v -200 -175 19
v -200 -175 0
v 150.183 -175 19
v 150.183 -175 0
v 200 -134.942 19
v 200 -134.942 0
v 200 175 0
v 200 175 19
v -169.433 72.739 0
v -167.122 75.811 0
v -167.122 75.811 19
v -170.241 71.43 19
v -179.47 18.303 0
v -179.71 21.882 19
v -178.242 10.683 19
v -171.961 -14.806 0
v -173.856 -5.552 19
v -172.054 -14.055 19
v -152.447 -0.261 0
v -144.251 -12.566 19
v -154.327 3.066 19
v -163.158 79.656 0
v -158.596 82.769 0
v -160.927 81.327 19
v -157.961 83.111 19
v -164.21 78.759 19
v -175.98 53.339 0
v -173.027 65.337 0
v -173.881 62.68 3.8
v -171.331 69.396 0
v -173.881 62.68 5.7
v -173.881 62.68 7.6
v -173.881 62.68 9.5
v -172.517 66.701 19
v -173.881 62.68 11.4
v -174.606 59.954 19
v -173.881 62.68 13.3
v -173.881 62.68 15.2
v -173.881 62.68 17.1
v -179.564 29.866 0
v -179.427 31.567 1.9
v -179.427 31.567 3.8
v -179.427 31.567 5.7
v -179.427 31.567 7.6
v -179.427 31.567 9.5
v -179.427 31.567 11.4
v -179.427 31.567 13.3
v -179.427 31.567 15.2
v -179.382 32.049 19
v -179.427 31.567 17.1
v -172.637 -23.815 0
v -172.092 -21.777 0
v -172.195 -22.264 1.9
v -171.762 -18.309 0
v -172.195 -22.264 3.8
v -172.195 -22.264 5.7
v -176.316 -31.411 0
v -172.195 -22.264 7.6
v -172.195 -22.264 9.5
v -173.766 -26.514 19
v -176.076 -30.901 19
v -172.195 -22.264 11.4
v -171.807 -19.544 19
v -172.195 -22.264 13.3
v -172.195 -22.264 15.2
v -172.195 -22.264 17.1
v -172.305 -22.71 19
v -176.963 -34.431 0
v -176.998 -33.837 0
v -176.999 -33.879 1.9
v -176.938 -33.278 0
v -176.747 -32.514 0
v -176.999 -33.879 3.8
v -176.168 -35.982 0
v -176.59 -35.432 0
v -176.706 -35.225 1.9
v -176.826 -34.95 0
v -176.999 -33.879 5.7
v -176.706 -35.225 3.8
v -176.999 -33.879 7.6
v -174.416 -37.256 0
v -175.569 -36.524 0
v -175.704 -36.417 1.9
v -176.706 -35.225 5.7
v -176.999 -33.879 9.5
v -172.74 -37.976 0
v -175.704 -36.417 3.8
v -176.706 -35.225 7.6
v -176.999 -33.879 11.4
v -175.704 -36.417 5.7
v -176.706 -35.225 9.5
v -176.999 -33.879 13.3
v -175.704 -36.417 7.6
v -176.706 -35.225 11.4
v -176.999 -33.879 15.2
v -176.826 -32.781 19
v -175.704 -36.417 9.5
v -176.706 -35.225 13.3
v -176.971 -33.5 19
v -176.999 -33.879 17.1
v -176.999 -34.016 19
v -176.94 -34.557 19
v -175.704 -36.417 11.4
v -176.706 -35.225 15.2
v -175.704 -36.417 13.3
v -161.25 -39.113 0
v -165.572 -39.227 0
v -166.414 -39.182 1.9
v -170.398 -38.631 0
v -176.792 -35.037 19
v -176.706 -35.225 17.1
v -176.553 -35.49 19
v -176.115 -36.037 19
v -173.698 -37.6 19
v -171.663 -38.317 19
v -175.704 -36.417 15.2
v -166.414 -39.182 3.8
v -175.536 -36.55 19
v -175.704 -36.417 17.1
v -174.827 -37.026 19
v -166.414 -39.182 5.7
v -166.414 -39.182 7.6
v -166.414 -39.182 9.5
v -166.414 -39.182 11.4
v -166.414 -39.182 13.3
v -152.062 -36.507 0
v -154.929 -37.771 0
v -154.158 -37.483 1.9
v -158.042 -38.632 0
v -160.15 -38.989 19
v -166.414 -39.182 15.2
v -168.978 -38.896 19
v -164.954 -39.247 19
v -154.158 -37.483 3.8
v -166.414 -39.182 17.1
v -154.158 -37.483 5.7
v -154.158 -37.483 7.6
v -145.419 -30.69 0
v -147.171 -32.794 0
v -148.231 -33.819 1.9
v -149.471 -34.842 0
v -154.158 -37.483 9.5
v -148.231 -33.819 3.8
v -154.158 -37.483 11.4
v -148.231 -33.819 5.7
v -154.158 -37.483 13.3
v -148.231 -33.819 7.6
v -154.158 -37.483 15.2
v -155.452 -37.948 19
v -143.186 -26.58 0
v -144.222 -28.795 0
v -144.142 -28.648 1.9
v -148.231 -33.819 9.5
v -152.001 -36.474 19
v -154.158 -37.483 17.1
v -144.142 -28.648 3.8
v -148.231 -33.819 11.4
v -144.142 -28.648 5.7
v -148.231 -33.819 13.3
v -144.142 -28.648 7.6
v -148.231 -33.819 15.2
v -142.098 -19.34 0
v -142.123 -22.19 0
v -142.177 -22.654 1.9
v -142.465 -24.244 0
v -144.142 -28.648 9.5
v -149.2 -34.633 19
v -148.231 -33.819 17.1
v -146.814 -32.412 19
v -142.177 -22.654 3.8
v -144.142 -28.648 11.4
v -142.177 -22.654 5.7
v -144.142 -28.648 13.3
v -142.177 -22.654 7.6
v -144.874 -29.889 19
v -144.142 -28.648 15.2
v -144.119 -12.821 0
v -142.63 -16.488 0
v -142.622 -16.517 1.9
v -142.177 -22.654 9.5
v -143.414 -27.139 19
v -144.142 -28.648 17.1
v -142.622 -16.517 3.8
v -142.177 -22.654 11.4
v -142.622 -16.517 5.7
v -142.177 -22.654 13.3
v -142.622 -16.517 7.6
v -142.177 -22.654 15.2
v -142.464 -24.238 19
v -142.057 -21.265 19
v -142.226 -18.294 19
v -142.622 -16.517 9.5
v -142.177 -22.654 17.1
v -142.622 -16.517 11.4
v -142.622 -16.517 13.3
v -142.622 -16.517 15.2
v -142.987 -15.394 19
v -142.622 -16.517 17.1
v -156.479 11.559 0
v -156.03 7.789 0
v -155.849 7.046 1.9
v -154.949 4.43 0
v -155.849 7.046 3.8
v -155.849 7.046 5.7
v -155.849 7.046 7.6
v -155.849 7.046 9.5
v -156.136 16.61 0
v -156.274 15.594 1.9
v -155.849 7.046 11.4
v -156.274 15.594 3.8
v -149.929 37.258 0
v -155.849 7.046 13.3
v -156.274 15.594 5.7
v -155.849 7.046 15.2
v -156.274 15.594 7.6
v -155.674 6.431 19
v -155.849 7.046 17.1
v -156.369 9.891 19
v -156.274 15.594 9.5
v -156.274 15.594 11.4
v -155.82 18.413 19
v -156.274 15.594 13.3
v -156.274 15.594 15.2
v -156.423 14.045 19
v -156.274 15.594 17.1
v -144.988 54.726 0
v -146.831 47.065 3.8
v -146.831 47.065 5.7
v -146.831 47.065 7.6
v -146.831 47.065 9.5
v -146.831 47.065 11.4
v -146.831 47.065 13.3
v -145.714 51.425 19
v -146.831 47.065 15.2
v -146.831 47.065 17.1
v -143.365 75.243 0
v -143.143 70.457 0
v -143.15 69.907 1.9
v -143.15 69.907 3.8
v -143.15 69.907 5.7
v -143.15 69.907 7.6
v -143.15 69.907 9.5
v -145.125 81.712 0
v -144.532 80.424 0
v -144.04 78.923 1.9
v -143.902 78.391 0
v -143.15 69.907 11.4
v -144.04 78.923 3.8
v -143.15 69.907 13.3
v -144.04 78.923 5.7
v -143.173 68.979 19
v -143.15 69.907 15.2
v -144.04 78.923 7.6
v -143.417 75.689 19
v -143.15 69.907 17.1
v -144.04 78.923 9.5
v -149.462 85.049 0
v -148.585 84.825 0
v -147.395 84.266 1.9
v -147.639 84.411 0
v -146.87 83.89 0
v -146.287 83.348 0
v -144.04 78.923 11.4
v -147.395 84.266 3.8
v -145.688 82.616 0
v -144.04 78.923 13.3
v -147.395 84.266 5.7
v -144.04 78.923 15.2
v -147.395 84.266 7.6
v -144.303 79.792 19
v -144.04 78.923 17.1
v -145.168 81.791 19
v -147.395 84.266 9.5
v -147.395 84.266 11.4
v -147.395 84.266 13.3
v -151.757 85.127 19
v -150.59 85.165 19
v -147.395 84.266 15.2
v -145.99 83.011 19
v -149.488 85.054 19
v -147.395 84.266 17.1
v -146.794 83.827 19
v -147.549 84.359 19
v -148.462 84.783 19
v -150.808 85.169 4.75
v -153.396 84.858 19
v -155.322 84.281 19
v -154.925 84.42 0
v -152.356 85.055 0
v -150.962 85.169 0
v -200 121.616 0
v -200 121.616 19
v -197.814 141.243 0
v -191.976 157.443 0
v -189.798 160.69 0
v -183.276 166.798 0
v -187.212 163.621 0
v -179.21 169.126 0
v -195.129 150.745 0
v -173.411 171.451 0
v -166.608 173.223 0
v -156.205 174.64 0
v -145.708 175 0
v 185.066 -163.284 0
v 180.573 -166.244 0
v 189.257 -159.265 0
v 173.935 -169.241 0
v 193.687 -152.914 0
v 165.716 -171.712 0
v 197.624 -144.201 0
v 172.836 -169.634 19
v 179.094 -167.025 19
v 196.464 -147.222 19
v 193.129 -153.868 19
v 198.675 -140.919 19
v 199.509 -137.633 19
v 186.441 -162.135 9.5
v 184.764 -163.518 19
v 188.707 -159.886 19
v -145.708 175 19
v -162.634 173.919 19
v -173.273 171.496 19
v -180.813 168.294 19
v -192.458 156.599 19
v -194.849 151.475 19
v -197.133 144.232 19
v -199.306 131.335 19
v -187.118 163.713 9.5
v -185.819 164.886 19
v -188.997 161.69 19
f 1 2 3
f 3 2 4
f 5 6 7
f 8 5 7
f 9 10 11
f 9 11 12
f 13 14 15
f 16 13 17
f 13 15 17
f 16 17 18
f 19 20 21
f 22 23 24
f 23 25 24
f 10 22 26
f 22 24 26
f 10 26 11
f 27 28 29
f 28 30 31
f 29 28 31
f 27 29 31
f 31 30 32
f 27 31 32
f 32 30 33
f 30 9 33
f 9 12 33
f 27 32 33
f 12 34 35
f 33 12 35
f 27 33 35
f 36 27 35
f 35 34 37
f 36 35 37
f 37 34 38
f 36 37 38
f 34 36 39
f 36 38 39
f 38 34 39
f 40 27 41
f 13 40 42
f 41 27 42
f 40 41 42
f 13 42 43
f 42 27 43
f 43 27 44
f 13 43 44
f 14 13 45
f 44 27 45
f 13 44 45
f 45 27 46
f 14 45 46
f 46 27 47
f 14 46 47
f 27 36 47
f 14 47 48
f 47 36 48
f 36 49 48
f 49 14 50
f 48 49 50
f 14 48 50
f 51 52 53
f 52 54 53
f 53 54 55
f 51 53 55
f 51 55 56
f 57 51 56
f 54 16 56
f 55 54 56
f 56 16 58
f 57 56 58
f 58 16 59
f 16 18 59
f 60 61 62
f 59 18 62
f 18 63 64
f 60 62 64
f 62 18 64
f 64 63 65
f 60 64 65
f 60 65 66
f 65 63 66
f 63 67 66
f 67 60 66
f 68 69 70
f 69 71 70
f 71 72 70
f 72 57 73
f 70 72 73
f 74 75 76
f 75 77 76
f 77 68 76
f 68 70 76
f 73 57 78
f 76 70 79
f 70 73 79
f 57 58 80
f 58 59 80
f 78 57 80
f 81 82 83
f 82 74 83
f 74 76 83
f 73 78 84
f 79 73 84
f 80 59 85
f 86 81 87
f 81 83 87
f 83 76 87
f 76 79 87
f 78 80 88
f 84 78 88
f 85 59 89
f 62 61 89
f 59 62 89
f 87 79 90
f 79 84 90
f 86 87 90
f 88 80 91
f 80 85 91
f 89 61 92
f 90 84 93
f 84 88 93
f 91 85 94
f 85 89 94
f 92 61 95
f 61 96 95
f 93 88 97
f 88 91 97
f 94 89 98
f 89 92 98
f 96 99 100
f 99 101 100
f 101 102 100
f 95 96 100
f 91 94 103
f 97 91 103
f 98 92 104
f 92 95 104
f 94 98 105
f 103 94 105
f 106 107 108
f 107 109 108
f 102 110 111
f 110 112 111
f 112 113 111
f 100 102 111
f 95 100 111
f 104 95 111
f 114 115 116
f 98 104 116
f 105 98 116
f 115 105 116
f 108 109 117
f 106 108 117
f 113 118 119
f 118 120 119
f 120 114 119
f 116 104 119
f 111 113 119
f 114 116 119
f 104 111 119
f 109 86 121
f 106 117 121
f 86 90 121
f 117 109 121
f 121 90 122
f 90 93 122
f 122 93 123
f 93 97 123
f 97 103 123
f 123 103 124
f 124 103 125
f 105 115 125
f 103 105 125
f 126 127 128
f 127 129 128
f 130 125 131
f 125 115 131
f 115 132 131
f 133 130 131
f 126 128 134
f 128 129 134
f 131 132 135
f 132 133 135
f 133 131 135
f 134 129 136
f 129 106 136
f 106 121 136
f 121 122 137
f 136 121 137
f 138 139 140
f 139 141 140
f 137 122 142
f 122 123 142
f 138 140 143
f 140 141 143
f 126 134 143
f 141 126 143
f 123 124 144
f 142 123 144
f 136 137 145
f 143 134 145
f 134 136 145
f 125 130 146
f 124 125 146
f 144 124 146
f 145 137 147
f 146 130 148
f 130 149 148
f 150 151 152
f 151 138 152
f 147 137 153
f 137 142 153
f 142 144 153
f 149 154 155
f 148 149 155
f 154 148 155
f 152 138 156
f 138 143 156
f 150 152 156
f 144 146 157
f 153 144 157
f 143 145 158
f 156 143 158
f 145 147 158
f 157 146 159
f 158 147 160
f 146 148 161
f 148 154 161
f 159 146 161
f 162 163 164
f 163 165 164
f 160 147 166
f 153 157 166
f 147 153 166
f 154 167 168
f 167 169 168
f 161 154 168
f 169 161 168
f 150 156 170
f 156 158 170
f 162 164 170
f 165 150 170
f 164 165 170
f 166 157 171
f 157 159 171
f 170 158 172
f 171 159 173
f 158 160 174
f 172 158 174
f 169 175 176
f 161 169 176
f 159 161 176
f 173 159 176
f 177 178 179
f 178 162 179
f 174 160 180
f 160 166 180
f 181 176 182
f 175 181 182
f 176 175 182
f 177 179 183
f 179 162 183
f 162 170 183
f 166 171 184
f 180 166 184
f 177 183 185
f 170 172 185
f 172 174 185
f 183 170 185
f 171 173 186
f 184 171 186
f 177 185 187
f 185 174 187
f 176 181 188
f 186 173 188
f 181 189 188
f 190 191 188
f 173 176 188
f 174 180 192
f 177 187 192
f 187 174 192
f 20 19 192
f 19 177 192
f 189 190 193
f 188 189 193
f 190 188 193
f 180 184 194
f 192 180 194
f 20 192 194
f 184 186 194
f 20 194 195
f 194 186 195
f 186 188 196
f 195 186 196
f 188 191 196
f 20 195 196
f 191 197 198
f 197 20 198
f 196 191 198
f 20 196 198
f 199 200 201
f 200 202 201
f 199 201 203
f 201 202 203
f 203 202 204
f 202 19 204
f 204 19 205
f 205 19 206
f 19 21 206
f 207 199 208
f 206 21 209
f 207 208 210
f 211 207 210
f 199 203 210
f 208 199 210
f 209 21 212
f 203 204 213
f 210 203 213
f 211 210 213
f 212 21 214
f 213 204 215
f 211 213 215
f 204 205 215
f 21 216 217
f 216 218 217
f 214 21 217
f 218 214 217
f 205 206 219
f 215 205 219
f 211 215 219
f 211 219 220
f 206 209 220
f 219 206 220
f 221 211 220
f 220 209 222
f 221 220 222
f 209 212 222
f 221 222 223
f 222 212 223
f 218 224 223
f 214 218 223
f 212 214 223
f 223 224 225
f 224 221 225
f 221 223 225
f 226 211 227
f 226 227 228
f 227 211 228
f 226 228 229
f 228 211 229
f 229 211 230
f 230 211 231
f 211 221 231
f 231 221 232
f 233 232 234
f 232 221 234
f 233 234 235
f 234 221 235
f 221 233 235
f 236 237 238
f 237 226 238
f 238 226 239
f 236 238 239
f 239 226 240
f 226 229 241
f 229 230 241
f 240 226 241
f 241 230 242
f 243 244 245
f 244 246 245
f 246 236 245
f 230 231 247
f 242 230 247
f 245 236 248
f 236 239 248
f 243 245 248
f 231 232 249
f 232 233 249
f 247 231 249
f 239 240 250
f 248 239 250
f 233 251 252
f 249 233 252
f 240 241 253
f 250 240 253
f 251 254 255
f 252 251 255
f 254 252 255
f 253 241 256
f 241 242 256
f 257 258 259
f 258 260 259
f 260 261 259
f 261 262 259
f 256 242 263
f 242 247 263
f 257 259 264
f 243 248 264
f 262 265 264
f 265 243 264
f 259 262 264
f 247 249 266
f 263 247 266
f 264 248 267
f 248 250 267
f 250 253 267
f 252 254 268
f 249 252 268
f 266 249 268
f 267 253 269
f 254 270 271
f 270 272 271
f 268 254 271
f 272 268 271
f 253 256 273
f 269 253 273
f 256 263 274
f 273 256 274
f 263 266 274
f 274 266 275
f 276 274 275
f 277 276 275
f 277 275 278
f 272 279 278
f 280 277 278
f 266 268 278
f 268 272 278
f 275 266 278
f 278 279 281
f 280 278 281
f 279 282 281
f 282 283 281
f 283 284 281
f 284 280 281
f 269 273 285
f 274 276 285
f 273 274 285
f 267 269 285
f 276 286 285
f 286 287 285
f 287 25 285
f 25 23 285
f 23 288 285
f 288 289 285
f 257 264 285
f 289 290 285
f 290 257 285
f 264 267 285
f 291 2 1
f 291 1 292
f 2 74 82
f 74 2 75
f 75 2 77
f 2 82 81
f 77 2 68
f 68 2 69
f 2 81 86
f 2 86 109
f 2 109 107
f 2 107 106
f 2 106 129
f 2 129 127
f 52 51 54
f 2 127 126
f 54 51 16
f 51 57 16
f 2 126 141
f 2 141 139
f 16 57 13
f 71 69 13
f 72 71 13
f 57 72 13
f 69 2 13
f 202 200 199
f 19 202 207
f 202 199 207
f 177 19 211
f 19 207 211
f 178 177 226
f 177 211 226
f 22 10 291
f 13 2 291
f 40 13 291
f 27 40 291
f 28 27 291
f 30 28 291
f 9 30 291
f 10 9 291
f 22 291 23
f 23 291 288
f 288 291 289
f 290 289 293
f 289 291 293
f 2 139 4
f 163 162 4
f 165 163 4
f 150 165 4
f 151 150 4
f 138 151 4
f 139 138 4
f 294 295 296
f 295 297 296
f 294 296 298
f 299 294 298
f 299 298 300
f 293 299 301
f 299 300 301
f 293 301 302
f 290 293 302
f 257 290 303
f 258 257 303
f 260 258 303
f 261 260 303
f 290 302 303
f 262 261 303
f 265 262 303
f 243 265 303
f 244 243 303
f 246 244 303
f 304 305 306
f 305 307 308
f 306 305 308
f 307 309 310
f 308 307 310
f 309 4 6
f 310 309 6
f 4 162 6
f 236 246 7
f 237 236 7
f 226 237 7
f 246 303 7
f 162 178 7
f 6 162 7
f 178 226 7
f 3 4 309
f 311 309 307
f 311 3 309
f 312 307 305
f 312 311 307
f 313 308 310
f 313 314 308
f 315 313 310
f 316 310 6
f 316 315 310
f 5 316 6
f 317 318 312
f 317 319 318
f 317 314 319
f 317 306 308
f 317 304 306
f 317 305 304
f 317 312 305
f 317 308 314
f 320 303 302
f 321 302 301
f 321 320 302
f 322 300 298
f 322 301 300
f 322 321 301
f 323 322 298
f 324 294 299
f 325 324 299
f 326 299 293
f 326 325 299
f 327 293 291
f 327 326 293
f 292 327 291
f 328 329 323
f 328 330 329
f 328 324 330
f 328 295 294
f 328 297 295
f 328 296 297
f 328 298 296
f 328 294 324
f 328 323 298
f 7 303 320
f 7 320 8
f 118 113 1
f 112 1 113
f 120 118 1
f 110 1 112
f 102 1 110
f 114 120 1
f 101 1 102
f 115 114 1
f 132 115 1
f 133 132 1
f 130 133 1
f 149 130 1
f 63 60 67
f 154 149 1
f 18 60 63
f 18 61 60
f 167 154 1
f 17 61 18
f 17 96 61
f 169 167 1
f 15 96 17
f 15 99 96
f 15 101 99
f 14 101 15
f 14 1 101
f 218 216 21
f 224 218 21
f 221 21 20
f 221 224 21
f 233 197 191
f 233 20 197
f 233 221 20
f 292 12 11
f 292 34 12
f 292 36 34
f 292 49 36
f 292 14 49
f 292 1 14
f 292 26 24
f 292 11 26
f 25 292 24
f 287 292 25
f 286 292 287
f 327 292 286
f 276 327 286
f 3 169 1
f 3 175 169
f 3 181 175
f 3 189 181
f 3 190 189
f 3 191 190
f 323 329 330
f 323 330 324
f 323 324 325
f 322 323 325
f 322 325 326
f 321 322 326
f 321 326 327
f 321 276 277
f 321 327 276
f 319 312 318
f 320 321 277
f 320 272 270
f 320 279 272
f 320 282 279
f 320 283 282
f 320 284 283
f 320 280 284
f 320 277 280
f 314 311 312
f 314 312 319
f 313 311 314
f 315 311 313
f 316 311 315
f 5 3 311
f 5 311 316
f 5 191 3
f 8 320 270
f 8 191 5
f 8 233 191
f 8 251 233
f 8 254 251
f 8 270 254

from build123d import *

# Parameters (mm, degrees)
F0_W     = 400
F0_H     = 350
F1_DEPTH = 19
F3_DEPTH = 19.001
F5_DEPTH = 19.0010001
F7_DEPTH = 19.0010001


with BuildPart() as f1:
    # F0 (on Top) → F1 (new body)
    with BuildSketch(Plane.XY):
        Rectangle(F0_W, F0_H)
    extrude(amount=F1_DEPTH)

    # F2 (on face) → F3 (cut, through all)
    with BuildSketch(Plane.XY.offset(19)):
        with BuildLine():
            add(Edge.make_bspline(
                [(-145.7076668739, 175), (-153.7114434414, 175), (-197.9093558229, 174.5698502037), (-199.5228952463, 130.1429581257), (-200, 121.6157187413)],
                knots=[0, 0, 0, 0, 0.4163787427, 0.838074678, 0.838074678, 0.838074678, 0.838074678], degree=3))
            Line((-145.7076668739, 175), (-200, 175))
            Line((-200, 175), (-200, 121.6157187413))
        make_face()
    extrude(amount=-F3_DEPTH, mode=Mode.SUBTRACT)

    # F4 (on face) → F5 (cut, through all)
    with BuildSketch(Plane.XY.offset(19)):
        with BuildLine():
            add(Edge.make_bspline(
                [(150.1834690571, -175), (160.493893298, -172.6533106613), (190.8117241774, -169.4206851853), (199.1673253263, -140.8786892729), (200, -134.9417865276)],
                knots=[0, 0, 0, 0, 0.4532102639, 0.8559847133, 0.8559847133, 0.8559847133, 0.8559847133], degree=3))
            Line((150.1834690571, -175), (200, -175))
            Line((200, -175), (200, -134.9417865276))
        make_face()
    extrude(amount=-F5_DEPTH, mode=Mode.SUBTRACT)

    # F6 (on face) → F7 (cut, through all)
    with BuildSketch(Plane.XY.offset(19)):
        with BuildLine():
            add(Edge.make_bspline(
                [(-167.1223193407, 75.8109614253), (-173.5084438064, 68.4049928594), (-176.548194404, 48.7209384478), (-183.4599341076, 15.0796886804), (-165.8342717612, -21.2152566444), (-184.2163299723, -37.6258072073), (-150.4015747749, -42.6759621033), (-135.4626623404, -15.85250952), (-164.8810957194, 6.9171346651), (-144.2013429008, 43.5402370236), (-139.9003526499, 93.8951004415), (-161.5481343057, 82.2753263734), (-167.1223193407, 75.8109614253)],
                knots=[0, 0, 0, 0, 0.1000633515, 0.2116272772, 0.3267000241, 0.3965458879, 0.4862861647, 0.5767126543, 0.6769159149, 0.7976651677, 0.9126588216, 1, 1, 1, 1], degree=3))
        make_face()
    extrude(amount=-F7_DEPTH, mode=Mode.SUBTRACT)


solid = f1.part
